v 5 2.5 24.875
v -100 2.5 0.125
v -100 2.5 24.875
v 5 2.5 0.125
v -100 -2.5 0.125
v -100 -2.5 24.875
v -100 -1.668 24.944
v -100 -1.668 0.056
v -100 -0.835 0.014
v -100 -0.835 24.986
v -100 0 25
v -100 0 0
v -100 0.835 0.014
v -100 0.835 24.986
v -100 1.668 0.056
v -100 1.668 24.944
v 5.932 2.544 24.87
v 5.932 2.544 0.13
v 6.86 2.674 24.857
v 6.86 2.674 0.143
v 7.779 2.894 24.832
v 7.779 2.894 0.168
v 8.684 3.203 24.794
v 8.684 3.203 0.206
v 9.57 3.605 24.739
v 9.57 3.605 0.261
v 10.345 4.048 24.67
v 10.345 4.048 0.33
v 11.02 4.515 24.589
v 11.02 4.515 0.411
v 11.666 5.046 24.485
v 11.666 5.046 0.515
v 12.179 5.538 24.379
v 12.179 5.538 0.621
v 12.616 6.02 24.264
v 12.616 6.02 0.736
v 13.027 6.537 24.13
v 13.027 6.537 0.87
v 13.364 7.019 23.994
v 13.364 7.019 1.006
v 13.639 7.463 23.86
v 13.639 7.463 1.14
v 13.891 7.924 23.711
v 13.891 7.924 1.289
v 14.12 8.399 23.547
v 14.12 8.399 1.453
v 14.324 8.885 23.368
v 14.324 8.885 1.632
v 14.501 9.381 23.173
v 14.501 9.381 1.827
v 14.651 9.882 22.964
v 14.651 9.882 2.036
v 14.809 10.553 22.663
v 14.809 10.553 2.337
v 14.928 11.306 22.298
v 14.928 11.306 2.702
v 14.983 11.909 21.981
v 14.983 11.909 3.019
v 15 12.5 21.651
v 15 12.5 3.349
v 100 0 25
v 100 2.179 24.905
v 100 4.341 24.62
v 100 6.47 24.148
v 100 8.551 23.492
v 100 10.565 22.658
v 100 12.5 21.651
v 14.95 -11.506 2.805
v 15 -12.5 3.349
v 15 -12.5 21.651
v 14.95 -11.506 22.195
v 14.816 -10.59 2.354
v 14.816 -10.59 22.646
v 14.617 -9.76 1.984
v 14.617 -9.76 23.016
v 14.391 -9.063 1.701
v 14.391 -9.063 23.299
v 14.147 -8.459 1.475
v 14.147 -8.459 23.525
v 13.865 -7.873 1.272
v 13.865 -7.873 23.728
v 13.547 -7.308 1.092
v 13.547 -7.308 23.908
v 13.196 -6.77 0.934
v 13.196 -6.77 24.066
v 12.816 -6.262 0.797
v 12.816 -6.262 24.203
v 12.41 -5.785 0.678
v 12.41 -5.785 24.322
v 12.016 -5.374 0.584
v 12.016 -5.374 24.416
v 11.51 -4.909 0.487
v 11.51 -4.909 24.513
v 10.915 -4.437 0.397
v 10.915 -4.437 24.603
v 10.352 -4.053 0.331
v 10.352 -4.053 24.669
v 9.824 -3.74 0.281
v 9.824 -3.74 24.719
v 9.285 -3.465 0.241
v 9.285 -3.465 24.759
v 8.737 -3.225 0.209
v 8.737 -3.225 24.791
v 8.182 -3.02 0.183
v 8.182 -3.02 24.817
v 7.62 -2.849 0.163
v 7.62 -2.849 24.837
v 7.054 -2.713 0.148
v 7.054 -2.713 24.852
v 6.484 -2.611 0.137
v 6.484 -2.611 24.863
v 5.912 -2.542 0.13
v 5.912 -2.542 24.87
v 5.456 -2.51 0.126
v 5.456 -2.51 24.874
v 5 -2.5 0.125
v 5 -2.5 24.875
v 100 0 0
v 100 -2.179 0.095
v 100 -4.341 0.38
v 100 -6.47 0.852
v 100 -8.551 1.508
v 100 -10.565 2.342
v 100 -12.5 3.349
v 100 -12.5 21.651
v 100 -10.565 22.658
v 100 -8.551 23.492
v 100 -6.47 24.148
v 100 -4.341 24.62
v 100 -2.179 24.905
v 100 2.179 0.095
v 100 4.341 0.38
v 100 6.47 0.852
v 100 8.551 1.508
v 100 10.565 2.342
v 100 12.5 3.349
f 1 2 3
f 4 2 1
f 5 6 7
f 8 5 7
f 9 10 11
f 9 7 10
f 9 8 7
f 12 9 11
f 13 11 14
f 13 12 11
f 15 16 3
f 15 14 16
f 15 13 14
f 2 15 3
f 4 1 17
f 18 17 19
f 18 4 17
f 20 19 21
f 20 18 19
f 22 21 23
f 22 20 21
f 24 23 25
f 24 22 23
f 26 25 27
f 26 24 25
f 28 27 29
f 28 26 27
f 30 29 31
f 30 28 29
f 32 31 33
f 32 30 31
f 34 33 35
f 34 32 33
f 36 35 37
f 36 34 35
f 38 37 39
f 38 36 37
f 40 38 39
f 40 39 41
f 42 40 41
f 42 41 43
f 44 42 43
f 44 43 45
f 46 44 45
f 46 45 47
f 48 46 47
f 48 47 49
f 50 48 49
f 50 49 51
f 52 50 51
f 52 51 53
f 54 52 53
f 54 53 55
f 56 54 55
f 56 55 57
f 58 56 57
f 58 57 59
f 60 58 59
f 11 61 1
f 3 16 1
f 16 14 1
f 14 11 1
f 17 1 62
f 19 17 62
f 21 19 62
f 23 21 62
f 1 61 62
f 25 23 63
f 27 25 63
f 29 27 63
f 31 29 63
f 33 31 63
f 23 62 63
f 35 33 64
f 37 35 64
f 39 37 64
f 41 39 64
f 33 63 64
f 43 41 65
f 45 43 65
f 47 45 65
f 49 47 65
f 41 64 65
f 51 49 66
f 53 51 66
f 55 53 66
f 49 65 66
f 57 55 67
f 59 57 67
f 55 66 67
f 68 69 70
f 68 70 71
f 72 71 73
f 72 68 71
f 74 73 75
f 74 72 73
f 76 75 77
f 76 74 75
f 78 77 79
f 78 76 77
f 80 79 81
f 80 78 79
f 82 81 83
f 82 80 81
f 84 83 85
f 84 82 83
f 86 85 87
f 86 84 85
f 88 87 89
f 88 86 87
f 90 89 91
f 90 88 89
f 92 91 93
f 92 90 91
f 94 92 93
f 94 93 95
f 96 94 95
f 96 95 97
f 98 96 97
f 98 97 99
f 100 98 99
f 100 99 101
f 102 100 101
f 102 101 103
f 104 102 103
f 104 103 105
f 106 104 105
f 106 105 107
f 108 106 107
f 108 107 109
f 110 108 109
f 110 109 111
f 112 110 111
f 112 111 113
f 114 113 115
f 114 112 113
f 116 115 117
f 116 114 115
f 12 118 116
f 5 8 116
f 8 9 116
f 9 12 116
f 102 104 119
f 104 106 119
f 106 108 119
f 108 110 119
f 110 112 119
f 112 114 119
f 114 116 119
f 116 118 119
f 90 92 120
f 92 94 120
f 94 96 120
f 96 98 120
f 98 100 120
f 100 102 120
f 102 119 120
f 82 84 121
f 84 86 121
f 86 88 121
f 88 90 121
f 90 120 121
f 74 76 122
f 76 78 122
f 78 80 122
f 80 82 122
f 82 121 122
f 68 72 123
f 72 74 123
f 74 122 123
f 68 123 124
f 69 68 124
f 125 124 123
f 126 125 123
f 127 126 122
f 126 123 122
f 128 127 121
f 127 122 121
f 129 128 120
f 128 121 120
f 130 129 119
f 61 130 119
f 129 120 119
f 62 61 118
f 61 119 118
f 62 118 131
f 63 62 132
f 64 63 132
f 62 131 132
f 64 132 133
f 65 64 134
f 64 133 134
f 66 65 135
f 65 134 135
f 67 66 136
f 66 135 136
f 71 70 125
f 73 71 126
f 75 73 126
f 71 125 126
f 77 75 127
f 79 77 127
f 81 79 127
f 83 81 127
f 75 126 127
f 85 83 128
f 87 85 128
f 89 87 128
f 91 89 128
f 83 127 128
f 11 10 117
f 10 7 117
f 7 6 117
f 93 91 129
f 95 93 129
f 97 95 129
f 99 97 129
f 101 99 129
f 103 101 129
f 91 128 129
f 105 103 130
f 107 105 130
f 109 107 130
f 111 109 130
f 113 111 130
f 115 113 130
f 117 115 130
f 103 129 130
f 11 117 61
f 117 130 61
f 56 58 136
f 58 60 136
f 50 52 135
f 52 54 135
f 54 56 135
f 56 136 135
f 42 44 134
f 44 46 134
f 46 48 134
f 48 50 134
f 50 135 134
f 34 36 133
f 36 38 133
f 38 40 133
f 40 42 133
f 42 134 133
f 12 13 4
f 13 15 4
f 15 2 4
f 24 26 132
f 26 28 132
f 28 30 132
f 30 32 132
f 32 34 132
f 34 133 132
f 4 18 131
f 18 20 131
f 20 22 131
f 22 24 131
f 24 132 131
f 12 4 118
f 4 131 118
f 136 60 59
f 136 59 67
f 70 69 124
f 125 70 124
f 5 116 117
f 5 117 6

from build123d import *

# Parameters (mm, degrees)
F0_W     = 200
F0_H     = 25
F1_DEPTH = 25
F3_DEPTH = 200.001
F5_DEPTH = 25.001


with BuildPart() as f1:
    # F0 (on Top) → F1 (new body)
    with BuildSketch(Plane.XY):
        Rectangle(F0_W, F0_H)
    extrude(amount=F1_DEPTH)

    # F2 (on face) → F3 (cut, through all)
    with BuildSketch(Plane.YZ.offset(100)):
        with BuildLine():
            ThreePointArc((0, 25), (6.470476, 24.148146), (12.5, 21.650635))
            Line((12.5, 21.650635), (12.5, 25))
            Line((12.5, 25), (0, 25))
        make_face()
        with BuildLine():
            Line((-12.5, 25), (-12.5, 21.650635))
            ThreePointArc((-12.5, 21.650635), (-6.470476, 24.148146), (0, 25))
            Line((0, 25), (-12.5, 25))
        make_face()
        with BuildLine():
            Line((12.5, 0), (12.5, 3.349365))
            ThreePointArc((12.5, 3.349365), (6.470476, 0.851854), (0, 0))
            Line((0, 0), (12.5, 0))
        make_face()
        with BuildLine():
            ThreePointArc((0, 0), (-6.470476, 0.851854), (-12.5, 3.349365))
            Line((-12.5, 3.349365), (-12.5, 0))
            Line((-12.5, 0), (0, 0))
        make_face()
    extrude(amount=-F3_DEPTH, mode=Mode.SUBTRACT)

    # F4 (on Top) → F5 (cut, through all)
    with BuildSketch(Plane.XY):
        with BuildLine():
            Line((-100, 12.5), (-100, 2.5))
            Line((-100, 2.5), (5, 2.5))
            ThreePointArc((5, 2.5), (12.071068, 5.428932), (15, 12.5))
            Line((15, 12.5), (-100, 12.5))
        make_face()
        with BuildLine():
            Line((-100, -2.5), (-100, -12.5))
            Line((-100, -12.5), (15, -12.5))
            ThreePointArc((15, -12.5), (12.071068, -5.428932), (5, -2.5))
            Line((5, -2.5), (-100, -2.5))
        make_face()
    extrude(amount=F5_DEPTH, mode=Mode.SUBTRACT)


solid = f1.part
